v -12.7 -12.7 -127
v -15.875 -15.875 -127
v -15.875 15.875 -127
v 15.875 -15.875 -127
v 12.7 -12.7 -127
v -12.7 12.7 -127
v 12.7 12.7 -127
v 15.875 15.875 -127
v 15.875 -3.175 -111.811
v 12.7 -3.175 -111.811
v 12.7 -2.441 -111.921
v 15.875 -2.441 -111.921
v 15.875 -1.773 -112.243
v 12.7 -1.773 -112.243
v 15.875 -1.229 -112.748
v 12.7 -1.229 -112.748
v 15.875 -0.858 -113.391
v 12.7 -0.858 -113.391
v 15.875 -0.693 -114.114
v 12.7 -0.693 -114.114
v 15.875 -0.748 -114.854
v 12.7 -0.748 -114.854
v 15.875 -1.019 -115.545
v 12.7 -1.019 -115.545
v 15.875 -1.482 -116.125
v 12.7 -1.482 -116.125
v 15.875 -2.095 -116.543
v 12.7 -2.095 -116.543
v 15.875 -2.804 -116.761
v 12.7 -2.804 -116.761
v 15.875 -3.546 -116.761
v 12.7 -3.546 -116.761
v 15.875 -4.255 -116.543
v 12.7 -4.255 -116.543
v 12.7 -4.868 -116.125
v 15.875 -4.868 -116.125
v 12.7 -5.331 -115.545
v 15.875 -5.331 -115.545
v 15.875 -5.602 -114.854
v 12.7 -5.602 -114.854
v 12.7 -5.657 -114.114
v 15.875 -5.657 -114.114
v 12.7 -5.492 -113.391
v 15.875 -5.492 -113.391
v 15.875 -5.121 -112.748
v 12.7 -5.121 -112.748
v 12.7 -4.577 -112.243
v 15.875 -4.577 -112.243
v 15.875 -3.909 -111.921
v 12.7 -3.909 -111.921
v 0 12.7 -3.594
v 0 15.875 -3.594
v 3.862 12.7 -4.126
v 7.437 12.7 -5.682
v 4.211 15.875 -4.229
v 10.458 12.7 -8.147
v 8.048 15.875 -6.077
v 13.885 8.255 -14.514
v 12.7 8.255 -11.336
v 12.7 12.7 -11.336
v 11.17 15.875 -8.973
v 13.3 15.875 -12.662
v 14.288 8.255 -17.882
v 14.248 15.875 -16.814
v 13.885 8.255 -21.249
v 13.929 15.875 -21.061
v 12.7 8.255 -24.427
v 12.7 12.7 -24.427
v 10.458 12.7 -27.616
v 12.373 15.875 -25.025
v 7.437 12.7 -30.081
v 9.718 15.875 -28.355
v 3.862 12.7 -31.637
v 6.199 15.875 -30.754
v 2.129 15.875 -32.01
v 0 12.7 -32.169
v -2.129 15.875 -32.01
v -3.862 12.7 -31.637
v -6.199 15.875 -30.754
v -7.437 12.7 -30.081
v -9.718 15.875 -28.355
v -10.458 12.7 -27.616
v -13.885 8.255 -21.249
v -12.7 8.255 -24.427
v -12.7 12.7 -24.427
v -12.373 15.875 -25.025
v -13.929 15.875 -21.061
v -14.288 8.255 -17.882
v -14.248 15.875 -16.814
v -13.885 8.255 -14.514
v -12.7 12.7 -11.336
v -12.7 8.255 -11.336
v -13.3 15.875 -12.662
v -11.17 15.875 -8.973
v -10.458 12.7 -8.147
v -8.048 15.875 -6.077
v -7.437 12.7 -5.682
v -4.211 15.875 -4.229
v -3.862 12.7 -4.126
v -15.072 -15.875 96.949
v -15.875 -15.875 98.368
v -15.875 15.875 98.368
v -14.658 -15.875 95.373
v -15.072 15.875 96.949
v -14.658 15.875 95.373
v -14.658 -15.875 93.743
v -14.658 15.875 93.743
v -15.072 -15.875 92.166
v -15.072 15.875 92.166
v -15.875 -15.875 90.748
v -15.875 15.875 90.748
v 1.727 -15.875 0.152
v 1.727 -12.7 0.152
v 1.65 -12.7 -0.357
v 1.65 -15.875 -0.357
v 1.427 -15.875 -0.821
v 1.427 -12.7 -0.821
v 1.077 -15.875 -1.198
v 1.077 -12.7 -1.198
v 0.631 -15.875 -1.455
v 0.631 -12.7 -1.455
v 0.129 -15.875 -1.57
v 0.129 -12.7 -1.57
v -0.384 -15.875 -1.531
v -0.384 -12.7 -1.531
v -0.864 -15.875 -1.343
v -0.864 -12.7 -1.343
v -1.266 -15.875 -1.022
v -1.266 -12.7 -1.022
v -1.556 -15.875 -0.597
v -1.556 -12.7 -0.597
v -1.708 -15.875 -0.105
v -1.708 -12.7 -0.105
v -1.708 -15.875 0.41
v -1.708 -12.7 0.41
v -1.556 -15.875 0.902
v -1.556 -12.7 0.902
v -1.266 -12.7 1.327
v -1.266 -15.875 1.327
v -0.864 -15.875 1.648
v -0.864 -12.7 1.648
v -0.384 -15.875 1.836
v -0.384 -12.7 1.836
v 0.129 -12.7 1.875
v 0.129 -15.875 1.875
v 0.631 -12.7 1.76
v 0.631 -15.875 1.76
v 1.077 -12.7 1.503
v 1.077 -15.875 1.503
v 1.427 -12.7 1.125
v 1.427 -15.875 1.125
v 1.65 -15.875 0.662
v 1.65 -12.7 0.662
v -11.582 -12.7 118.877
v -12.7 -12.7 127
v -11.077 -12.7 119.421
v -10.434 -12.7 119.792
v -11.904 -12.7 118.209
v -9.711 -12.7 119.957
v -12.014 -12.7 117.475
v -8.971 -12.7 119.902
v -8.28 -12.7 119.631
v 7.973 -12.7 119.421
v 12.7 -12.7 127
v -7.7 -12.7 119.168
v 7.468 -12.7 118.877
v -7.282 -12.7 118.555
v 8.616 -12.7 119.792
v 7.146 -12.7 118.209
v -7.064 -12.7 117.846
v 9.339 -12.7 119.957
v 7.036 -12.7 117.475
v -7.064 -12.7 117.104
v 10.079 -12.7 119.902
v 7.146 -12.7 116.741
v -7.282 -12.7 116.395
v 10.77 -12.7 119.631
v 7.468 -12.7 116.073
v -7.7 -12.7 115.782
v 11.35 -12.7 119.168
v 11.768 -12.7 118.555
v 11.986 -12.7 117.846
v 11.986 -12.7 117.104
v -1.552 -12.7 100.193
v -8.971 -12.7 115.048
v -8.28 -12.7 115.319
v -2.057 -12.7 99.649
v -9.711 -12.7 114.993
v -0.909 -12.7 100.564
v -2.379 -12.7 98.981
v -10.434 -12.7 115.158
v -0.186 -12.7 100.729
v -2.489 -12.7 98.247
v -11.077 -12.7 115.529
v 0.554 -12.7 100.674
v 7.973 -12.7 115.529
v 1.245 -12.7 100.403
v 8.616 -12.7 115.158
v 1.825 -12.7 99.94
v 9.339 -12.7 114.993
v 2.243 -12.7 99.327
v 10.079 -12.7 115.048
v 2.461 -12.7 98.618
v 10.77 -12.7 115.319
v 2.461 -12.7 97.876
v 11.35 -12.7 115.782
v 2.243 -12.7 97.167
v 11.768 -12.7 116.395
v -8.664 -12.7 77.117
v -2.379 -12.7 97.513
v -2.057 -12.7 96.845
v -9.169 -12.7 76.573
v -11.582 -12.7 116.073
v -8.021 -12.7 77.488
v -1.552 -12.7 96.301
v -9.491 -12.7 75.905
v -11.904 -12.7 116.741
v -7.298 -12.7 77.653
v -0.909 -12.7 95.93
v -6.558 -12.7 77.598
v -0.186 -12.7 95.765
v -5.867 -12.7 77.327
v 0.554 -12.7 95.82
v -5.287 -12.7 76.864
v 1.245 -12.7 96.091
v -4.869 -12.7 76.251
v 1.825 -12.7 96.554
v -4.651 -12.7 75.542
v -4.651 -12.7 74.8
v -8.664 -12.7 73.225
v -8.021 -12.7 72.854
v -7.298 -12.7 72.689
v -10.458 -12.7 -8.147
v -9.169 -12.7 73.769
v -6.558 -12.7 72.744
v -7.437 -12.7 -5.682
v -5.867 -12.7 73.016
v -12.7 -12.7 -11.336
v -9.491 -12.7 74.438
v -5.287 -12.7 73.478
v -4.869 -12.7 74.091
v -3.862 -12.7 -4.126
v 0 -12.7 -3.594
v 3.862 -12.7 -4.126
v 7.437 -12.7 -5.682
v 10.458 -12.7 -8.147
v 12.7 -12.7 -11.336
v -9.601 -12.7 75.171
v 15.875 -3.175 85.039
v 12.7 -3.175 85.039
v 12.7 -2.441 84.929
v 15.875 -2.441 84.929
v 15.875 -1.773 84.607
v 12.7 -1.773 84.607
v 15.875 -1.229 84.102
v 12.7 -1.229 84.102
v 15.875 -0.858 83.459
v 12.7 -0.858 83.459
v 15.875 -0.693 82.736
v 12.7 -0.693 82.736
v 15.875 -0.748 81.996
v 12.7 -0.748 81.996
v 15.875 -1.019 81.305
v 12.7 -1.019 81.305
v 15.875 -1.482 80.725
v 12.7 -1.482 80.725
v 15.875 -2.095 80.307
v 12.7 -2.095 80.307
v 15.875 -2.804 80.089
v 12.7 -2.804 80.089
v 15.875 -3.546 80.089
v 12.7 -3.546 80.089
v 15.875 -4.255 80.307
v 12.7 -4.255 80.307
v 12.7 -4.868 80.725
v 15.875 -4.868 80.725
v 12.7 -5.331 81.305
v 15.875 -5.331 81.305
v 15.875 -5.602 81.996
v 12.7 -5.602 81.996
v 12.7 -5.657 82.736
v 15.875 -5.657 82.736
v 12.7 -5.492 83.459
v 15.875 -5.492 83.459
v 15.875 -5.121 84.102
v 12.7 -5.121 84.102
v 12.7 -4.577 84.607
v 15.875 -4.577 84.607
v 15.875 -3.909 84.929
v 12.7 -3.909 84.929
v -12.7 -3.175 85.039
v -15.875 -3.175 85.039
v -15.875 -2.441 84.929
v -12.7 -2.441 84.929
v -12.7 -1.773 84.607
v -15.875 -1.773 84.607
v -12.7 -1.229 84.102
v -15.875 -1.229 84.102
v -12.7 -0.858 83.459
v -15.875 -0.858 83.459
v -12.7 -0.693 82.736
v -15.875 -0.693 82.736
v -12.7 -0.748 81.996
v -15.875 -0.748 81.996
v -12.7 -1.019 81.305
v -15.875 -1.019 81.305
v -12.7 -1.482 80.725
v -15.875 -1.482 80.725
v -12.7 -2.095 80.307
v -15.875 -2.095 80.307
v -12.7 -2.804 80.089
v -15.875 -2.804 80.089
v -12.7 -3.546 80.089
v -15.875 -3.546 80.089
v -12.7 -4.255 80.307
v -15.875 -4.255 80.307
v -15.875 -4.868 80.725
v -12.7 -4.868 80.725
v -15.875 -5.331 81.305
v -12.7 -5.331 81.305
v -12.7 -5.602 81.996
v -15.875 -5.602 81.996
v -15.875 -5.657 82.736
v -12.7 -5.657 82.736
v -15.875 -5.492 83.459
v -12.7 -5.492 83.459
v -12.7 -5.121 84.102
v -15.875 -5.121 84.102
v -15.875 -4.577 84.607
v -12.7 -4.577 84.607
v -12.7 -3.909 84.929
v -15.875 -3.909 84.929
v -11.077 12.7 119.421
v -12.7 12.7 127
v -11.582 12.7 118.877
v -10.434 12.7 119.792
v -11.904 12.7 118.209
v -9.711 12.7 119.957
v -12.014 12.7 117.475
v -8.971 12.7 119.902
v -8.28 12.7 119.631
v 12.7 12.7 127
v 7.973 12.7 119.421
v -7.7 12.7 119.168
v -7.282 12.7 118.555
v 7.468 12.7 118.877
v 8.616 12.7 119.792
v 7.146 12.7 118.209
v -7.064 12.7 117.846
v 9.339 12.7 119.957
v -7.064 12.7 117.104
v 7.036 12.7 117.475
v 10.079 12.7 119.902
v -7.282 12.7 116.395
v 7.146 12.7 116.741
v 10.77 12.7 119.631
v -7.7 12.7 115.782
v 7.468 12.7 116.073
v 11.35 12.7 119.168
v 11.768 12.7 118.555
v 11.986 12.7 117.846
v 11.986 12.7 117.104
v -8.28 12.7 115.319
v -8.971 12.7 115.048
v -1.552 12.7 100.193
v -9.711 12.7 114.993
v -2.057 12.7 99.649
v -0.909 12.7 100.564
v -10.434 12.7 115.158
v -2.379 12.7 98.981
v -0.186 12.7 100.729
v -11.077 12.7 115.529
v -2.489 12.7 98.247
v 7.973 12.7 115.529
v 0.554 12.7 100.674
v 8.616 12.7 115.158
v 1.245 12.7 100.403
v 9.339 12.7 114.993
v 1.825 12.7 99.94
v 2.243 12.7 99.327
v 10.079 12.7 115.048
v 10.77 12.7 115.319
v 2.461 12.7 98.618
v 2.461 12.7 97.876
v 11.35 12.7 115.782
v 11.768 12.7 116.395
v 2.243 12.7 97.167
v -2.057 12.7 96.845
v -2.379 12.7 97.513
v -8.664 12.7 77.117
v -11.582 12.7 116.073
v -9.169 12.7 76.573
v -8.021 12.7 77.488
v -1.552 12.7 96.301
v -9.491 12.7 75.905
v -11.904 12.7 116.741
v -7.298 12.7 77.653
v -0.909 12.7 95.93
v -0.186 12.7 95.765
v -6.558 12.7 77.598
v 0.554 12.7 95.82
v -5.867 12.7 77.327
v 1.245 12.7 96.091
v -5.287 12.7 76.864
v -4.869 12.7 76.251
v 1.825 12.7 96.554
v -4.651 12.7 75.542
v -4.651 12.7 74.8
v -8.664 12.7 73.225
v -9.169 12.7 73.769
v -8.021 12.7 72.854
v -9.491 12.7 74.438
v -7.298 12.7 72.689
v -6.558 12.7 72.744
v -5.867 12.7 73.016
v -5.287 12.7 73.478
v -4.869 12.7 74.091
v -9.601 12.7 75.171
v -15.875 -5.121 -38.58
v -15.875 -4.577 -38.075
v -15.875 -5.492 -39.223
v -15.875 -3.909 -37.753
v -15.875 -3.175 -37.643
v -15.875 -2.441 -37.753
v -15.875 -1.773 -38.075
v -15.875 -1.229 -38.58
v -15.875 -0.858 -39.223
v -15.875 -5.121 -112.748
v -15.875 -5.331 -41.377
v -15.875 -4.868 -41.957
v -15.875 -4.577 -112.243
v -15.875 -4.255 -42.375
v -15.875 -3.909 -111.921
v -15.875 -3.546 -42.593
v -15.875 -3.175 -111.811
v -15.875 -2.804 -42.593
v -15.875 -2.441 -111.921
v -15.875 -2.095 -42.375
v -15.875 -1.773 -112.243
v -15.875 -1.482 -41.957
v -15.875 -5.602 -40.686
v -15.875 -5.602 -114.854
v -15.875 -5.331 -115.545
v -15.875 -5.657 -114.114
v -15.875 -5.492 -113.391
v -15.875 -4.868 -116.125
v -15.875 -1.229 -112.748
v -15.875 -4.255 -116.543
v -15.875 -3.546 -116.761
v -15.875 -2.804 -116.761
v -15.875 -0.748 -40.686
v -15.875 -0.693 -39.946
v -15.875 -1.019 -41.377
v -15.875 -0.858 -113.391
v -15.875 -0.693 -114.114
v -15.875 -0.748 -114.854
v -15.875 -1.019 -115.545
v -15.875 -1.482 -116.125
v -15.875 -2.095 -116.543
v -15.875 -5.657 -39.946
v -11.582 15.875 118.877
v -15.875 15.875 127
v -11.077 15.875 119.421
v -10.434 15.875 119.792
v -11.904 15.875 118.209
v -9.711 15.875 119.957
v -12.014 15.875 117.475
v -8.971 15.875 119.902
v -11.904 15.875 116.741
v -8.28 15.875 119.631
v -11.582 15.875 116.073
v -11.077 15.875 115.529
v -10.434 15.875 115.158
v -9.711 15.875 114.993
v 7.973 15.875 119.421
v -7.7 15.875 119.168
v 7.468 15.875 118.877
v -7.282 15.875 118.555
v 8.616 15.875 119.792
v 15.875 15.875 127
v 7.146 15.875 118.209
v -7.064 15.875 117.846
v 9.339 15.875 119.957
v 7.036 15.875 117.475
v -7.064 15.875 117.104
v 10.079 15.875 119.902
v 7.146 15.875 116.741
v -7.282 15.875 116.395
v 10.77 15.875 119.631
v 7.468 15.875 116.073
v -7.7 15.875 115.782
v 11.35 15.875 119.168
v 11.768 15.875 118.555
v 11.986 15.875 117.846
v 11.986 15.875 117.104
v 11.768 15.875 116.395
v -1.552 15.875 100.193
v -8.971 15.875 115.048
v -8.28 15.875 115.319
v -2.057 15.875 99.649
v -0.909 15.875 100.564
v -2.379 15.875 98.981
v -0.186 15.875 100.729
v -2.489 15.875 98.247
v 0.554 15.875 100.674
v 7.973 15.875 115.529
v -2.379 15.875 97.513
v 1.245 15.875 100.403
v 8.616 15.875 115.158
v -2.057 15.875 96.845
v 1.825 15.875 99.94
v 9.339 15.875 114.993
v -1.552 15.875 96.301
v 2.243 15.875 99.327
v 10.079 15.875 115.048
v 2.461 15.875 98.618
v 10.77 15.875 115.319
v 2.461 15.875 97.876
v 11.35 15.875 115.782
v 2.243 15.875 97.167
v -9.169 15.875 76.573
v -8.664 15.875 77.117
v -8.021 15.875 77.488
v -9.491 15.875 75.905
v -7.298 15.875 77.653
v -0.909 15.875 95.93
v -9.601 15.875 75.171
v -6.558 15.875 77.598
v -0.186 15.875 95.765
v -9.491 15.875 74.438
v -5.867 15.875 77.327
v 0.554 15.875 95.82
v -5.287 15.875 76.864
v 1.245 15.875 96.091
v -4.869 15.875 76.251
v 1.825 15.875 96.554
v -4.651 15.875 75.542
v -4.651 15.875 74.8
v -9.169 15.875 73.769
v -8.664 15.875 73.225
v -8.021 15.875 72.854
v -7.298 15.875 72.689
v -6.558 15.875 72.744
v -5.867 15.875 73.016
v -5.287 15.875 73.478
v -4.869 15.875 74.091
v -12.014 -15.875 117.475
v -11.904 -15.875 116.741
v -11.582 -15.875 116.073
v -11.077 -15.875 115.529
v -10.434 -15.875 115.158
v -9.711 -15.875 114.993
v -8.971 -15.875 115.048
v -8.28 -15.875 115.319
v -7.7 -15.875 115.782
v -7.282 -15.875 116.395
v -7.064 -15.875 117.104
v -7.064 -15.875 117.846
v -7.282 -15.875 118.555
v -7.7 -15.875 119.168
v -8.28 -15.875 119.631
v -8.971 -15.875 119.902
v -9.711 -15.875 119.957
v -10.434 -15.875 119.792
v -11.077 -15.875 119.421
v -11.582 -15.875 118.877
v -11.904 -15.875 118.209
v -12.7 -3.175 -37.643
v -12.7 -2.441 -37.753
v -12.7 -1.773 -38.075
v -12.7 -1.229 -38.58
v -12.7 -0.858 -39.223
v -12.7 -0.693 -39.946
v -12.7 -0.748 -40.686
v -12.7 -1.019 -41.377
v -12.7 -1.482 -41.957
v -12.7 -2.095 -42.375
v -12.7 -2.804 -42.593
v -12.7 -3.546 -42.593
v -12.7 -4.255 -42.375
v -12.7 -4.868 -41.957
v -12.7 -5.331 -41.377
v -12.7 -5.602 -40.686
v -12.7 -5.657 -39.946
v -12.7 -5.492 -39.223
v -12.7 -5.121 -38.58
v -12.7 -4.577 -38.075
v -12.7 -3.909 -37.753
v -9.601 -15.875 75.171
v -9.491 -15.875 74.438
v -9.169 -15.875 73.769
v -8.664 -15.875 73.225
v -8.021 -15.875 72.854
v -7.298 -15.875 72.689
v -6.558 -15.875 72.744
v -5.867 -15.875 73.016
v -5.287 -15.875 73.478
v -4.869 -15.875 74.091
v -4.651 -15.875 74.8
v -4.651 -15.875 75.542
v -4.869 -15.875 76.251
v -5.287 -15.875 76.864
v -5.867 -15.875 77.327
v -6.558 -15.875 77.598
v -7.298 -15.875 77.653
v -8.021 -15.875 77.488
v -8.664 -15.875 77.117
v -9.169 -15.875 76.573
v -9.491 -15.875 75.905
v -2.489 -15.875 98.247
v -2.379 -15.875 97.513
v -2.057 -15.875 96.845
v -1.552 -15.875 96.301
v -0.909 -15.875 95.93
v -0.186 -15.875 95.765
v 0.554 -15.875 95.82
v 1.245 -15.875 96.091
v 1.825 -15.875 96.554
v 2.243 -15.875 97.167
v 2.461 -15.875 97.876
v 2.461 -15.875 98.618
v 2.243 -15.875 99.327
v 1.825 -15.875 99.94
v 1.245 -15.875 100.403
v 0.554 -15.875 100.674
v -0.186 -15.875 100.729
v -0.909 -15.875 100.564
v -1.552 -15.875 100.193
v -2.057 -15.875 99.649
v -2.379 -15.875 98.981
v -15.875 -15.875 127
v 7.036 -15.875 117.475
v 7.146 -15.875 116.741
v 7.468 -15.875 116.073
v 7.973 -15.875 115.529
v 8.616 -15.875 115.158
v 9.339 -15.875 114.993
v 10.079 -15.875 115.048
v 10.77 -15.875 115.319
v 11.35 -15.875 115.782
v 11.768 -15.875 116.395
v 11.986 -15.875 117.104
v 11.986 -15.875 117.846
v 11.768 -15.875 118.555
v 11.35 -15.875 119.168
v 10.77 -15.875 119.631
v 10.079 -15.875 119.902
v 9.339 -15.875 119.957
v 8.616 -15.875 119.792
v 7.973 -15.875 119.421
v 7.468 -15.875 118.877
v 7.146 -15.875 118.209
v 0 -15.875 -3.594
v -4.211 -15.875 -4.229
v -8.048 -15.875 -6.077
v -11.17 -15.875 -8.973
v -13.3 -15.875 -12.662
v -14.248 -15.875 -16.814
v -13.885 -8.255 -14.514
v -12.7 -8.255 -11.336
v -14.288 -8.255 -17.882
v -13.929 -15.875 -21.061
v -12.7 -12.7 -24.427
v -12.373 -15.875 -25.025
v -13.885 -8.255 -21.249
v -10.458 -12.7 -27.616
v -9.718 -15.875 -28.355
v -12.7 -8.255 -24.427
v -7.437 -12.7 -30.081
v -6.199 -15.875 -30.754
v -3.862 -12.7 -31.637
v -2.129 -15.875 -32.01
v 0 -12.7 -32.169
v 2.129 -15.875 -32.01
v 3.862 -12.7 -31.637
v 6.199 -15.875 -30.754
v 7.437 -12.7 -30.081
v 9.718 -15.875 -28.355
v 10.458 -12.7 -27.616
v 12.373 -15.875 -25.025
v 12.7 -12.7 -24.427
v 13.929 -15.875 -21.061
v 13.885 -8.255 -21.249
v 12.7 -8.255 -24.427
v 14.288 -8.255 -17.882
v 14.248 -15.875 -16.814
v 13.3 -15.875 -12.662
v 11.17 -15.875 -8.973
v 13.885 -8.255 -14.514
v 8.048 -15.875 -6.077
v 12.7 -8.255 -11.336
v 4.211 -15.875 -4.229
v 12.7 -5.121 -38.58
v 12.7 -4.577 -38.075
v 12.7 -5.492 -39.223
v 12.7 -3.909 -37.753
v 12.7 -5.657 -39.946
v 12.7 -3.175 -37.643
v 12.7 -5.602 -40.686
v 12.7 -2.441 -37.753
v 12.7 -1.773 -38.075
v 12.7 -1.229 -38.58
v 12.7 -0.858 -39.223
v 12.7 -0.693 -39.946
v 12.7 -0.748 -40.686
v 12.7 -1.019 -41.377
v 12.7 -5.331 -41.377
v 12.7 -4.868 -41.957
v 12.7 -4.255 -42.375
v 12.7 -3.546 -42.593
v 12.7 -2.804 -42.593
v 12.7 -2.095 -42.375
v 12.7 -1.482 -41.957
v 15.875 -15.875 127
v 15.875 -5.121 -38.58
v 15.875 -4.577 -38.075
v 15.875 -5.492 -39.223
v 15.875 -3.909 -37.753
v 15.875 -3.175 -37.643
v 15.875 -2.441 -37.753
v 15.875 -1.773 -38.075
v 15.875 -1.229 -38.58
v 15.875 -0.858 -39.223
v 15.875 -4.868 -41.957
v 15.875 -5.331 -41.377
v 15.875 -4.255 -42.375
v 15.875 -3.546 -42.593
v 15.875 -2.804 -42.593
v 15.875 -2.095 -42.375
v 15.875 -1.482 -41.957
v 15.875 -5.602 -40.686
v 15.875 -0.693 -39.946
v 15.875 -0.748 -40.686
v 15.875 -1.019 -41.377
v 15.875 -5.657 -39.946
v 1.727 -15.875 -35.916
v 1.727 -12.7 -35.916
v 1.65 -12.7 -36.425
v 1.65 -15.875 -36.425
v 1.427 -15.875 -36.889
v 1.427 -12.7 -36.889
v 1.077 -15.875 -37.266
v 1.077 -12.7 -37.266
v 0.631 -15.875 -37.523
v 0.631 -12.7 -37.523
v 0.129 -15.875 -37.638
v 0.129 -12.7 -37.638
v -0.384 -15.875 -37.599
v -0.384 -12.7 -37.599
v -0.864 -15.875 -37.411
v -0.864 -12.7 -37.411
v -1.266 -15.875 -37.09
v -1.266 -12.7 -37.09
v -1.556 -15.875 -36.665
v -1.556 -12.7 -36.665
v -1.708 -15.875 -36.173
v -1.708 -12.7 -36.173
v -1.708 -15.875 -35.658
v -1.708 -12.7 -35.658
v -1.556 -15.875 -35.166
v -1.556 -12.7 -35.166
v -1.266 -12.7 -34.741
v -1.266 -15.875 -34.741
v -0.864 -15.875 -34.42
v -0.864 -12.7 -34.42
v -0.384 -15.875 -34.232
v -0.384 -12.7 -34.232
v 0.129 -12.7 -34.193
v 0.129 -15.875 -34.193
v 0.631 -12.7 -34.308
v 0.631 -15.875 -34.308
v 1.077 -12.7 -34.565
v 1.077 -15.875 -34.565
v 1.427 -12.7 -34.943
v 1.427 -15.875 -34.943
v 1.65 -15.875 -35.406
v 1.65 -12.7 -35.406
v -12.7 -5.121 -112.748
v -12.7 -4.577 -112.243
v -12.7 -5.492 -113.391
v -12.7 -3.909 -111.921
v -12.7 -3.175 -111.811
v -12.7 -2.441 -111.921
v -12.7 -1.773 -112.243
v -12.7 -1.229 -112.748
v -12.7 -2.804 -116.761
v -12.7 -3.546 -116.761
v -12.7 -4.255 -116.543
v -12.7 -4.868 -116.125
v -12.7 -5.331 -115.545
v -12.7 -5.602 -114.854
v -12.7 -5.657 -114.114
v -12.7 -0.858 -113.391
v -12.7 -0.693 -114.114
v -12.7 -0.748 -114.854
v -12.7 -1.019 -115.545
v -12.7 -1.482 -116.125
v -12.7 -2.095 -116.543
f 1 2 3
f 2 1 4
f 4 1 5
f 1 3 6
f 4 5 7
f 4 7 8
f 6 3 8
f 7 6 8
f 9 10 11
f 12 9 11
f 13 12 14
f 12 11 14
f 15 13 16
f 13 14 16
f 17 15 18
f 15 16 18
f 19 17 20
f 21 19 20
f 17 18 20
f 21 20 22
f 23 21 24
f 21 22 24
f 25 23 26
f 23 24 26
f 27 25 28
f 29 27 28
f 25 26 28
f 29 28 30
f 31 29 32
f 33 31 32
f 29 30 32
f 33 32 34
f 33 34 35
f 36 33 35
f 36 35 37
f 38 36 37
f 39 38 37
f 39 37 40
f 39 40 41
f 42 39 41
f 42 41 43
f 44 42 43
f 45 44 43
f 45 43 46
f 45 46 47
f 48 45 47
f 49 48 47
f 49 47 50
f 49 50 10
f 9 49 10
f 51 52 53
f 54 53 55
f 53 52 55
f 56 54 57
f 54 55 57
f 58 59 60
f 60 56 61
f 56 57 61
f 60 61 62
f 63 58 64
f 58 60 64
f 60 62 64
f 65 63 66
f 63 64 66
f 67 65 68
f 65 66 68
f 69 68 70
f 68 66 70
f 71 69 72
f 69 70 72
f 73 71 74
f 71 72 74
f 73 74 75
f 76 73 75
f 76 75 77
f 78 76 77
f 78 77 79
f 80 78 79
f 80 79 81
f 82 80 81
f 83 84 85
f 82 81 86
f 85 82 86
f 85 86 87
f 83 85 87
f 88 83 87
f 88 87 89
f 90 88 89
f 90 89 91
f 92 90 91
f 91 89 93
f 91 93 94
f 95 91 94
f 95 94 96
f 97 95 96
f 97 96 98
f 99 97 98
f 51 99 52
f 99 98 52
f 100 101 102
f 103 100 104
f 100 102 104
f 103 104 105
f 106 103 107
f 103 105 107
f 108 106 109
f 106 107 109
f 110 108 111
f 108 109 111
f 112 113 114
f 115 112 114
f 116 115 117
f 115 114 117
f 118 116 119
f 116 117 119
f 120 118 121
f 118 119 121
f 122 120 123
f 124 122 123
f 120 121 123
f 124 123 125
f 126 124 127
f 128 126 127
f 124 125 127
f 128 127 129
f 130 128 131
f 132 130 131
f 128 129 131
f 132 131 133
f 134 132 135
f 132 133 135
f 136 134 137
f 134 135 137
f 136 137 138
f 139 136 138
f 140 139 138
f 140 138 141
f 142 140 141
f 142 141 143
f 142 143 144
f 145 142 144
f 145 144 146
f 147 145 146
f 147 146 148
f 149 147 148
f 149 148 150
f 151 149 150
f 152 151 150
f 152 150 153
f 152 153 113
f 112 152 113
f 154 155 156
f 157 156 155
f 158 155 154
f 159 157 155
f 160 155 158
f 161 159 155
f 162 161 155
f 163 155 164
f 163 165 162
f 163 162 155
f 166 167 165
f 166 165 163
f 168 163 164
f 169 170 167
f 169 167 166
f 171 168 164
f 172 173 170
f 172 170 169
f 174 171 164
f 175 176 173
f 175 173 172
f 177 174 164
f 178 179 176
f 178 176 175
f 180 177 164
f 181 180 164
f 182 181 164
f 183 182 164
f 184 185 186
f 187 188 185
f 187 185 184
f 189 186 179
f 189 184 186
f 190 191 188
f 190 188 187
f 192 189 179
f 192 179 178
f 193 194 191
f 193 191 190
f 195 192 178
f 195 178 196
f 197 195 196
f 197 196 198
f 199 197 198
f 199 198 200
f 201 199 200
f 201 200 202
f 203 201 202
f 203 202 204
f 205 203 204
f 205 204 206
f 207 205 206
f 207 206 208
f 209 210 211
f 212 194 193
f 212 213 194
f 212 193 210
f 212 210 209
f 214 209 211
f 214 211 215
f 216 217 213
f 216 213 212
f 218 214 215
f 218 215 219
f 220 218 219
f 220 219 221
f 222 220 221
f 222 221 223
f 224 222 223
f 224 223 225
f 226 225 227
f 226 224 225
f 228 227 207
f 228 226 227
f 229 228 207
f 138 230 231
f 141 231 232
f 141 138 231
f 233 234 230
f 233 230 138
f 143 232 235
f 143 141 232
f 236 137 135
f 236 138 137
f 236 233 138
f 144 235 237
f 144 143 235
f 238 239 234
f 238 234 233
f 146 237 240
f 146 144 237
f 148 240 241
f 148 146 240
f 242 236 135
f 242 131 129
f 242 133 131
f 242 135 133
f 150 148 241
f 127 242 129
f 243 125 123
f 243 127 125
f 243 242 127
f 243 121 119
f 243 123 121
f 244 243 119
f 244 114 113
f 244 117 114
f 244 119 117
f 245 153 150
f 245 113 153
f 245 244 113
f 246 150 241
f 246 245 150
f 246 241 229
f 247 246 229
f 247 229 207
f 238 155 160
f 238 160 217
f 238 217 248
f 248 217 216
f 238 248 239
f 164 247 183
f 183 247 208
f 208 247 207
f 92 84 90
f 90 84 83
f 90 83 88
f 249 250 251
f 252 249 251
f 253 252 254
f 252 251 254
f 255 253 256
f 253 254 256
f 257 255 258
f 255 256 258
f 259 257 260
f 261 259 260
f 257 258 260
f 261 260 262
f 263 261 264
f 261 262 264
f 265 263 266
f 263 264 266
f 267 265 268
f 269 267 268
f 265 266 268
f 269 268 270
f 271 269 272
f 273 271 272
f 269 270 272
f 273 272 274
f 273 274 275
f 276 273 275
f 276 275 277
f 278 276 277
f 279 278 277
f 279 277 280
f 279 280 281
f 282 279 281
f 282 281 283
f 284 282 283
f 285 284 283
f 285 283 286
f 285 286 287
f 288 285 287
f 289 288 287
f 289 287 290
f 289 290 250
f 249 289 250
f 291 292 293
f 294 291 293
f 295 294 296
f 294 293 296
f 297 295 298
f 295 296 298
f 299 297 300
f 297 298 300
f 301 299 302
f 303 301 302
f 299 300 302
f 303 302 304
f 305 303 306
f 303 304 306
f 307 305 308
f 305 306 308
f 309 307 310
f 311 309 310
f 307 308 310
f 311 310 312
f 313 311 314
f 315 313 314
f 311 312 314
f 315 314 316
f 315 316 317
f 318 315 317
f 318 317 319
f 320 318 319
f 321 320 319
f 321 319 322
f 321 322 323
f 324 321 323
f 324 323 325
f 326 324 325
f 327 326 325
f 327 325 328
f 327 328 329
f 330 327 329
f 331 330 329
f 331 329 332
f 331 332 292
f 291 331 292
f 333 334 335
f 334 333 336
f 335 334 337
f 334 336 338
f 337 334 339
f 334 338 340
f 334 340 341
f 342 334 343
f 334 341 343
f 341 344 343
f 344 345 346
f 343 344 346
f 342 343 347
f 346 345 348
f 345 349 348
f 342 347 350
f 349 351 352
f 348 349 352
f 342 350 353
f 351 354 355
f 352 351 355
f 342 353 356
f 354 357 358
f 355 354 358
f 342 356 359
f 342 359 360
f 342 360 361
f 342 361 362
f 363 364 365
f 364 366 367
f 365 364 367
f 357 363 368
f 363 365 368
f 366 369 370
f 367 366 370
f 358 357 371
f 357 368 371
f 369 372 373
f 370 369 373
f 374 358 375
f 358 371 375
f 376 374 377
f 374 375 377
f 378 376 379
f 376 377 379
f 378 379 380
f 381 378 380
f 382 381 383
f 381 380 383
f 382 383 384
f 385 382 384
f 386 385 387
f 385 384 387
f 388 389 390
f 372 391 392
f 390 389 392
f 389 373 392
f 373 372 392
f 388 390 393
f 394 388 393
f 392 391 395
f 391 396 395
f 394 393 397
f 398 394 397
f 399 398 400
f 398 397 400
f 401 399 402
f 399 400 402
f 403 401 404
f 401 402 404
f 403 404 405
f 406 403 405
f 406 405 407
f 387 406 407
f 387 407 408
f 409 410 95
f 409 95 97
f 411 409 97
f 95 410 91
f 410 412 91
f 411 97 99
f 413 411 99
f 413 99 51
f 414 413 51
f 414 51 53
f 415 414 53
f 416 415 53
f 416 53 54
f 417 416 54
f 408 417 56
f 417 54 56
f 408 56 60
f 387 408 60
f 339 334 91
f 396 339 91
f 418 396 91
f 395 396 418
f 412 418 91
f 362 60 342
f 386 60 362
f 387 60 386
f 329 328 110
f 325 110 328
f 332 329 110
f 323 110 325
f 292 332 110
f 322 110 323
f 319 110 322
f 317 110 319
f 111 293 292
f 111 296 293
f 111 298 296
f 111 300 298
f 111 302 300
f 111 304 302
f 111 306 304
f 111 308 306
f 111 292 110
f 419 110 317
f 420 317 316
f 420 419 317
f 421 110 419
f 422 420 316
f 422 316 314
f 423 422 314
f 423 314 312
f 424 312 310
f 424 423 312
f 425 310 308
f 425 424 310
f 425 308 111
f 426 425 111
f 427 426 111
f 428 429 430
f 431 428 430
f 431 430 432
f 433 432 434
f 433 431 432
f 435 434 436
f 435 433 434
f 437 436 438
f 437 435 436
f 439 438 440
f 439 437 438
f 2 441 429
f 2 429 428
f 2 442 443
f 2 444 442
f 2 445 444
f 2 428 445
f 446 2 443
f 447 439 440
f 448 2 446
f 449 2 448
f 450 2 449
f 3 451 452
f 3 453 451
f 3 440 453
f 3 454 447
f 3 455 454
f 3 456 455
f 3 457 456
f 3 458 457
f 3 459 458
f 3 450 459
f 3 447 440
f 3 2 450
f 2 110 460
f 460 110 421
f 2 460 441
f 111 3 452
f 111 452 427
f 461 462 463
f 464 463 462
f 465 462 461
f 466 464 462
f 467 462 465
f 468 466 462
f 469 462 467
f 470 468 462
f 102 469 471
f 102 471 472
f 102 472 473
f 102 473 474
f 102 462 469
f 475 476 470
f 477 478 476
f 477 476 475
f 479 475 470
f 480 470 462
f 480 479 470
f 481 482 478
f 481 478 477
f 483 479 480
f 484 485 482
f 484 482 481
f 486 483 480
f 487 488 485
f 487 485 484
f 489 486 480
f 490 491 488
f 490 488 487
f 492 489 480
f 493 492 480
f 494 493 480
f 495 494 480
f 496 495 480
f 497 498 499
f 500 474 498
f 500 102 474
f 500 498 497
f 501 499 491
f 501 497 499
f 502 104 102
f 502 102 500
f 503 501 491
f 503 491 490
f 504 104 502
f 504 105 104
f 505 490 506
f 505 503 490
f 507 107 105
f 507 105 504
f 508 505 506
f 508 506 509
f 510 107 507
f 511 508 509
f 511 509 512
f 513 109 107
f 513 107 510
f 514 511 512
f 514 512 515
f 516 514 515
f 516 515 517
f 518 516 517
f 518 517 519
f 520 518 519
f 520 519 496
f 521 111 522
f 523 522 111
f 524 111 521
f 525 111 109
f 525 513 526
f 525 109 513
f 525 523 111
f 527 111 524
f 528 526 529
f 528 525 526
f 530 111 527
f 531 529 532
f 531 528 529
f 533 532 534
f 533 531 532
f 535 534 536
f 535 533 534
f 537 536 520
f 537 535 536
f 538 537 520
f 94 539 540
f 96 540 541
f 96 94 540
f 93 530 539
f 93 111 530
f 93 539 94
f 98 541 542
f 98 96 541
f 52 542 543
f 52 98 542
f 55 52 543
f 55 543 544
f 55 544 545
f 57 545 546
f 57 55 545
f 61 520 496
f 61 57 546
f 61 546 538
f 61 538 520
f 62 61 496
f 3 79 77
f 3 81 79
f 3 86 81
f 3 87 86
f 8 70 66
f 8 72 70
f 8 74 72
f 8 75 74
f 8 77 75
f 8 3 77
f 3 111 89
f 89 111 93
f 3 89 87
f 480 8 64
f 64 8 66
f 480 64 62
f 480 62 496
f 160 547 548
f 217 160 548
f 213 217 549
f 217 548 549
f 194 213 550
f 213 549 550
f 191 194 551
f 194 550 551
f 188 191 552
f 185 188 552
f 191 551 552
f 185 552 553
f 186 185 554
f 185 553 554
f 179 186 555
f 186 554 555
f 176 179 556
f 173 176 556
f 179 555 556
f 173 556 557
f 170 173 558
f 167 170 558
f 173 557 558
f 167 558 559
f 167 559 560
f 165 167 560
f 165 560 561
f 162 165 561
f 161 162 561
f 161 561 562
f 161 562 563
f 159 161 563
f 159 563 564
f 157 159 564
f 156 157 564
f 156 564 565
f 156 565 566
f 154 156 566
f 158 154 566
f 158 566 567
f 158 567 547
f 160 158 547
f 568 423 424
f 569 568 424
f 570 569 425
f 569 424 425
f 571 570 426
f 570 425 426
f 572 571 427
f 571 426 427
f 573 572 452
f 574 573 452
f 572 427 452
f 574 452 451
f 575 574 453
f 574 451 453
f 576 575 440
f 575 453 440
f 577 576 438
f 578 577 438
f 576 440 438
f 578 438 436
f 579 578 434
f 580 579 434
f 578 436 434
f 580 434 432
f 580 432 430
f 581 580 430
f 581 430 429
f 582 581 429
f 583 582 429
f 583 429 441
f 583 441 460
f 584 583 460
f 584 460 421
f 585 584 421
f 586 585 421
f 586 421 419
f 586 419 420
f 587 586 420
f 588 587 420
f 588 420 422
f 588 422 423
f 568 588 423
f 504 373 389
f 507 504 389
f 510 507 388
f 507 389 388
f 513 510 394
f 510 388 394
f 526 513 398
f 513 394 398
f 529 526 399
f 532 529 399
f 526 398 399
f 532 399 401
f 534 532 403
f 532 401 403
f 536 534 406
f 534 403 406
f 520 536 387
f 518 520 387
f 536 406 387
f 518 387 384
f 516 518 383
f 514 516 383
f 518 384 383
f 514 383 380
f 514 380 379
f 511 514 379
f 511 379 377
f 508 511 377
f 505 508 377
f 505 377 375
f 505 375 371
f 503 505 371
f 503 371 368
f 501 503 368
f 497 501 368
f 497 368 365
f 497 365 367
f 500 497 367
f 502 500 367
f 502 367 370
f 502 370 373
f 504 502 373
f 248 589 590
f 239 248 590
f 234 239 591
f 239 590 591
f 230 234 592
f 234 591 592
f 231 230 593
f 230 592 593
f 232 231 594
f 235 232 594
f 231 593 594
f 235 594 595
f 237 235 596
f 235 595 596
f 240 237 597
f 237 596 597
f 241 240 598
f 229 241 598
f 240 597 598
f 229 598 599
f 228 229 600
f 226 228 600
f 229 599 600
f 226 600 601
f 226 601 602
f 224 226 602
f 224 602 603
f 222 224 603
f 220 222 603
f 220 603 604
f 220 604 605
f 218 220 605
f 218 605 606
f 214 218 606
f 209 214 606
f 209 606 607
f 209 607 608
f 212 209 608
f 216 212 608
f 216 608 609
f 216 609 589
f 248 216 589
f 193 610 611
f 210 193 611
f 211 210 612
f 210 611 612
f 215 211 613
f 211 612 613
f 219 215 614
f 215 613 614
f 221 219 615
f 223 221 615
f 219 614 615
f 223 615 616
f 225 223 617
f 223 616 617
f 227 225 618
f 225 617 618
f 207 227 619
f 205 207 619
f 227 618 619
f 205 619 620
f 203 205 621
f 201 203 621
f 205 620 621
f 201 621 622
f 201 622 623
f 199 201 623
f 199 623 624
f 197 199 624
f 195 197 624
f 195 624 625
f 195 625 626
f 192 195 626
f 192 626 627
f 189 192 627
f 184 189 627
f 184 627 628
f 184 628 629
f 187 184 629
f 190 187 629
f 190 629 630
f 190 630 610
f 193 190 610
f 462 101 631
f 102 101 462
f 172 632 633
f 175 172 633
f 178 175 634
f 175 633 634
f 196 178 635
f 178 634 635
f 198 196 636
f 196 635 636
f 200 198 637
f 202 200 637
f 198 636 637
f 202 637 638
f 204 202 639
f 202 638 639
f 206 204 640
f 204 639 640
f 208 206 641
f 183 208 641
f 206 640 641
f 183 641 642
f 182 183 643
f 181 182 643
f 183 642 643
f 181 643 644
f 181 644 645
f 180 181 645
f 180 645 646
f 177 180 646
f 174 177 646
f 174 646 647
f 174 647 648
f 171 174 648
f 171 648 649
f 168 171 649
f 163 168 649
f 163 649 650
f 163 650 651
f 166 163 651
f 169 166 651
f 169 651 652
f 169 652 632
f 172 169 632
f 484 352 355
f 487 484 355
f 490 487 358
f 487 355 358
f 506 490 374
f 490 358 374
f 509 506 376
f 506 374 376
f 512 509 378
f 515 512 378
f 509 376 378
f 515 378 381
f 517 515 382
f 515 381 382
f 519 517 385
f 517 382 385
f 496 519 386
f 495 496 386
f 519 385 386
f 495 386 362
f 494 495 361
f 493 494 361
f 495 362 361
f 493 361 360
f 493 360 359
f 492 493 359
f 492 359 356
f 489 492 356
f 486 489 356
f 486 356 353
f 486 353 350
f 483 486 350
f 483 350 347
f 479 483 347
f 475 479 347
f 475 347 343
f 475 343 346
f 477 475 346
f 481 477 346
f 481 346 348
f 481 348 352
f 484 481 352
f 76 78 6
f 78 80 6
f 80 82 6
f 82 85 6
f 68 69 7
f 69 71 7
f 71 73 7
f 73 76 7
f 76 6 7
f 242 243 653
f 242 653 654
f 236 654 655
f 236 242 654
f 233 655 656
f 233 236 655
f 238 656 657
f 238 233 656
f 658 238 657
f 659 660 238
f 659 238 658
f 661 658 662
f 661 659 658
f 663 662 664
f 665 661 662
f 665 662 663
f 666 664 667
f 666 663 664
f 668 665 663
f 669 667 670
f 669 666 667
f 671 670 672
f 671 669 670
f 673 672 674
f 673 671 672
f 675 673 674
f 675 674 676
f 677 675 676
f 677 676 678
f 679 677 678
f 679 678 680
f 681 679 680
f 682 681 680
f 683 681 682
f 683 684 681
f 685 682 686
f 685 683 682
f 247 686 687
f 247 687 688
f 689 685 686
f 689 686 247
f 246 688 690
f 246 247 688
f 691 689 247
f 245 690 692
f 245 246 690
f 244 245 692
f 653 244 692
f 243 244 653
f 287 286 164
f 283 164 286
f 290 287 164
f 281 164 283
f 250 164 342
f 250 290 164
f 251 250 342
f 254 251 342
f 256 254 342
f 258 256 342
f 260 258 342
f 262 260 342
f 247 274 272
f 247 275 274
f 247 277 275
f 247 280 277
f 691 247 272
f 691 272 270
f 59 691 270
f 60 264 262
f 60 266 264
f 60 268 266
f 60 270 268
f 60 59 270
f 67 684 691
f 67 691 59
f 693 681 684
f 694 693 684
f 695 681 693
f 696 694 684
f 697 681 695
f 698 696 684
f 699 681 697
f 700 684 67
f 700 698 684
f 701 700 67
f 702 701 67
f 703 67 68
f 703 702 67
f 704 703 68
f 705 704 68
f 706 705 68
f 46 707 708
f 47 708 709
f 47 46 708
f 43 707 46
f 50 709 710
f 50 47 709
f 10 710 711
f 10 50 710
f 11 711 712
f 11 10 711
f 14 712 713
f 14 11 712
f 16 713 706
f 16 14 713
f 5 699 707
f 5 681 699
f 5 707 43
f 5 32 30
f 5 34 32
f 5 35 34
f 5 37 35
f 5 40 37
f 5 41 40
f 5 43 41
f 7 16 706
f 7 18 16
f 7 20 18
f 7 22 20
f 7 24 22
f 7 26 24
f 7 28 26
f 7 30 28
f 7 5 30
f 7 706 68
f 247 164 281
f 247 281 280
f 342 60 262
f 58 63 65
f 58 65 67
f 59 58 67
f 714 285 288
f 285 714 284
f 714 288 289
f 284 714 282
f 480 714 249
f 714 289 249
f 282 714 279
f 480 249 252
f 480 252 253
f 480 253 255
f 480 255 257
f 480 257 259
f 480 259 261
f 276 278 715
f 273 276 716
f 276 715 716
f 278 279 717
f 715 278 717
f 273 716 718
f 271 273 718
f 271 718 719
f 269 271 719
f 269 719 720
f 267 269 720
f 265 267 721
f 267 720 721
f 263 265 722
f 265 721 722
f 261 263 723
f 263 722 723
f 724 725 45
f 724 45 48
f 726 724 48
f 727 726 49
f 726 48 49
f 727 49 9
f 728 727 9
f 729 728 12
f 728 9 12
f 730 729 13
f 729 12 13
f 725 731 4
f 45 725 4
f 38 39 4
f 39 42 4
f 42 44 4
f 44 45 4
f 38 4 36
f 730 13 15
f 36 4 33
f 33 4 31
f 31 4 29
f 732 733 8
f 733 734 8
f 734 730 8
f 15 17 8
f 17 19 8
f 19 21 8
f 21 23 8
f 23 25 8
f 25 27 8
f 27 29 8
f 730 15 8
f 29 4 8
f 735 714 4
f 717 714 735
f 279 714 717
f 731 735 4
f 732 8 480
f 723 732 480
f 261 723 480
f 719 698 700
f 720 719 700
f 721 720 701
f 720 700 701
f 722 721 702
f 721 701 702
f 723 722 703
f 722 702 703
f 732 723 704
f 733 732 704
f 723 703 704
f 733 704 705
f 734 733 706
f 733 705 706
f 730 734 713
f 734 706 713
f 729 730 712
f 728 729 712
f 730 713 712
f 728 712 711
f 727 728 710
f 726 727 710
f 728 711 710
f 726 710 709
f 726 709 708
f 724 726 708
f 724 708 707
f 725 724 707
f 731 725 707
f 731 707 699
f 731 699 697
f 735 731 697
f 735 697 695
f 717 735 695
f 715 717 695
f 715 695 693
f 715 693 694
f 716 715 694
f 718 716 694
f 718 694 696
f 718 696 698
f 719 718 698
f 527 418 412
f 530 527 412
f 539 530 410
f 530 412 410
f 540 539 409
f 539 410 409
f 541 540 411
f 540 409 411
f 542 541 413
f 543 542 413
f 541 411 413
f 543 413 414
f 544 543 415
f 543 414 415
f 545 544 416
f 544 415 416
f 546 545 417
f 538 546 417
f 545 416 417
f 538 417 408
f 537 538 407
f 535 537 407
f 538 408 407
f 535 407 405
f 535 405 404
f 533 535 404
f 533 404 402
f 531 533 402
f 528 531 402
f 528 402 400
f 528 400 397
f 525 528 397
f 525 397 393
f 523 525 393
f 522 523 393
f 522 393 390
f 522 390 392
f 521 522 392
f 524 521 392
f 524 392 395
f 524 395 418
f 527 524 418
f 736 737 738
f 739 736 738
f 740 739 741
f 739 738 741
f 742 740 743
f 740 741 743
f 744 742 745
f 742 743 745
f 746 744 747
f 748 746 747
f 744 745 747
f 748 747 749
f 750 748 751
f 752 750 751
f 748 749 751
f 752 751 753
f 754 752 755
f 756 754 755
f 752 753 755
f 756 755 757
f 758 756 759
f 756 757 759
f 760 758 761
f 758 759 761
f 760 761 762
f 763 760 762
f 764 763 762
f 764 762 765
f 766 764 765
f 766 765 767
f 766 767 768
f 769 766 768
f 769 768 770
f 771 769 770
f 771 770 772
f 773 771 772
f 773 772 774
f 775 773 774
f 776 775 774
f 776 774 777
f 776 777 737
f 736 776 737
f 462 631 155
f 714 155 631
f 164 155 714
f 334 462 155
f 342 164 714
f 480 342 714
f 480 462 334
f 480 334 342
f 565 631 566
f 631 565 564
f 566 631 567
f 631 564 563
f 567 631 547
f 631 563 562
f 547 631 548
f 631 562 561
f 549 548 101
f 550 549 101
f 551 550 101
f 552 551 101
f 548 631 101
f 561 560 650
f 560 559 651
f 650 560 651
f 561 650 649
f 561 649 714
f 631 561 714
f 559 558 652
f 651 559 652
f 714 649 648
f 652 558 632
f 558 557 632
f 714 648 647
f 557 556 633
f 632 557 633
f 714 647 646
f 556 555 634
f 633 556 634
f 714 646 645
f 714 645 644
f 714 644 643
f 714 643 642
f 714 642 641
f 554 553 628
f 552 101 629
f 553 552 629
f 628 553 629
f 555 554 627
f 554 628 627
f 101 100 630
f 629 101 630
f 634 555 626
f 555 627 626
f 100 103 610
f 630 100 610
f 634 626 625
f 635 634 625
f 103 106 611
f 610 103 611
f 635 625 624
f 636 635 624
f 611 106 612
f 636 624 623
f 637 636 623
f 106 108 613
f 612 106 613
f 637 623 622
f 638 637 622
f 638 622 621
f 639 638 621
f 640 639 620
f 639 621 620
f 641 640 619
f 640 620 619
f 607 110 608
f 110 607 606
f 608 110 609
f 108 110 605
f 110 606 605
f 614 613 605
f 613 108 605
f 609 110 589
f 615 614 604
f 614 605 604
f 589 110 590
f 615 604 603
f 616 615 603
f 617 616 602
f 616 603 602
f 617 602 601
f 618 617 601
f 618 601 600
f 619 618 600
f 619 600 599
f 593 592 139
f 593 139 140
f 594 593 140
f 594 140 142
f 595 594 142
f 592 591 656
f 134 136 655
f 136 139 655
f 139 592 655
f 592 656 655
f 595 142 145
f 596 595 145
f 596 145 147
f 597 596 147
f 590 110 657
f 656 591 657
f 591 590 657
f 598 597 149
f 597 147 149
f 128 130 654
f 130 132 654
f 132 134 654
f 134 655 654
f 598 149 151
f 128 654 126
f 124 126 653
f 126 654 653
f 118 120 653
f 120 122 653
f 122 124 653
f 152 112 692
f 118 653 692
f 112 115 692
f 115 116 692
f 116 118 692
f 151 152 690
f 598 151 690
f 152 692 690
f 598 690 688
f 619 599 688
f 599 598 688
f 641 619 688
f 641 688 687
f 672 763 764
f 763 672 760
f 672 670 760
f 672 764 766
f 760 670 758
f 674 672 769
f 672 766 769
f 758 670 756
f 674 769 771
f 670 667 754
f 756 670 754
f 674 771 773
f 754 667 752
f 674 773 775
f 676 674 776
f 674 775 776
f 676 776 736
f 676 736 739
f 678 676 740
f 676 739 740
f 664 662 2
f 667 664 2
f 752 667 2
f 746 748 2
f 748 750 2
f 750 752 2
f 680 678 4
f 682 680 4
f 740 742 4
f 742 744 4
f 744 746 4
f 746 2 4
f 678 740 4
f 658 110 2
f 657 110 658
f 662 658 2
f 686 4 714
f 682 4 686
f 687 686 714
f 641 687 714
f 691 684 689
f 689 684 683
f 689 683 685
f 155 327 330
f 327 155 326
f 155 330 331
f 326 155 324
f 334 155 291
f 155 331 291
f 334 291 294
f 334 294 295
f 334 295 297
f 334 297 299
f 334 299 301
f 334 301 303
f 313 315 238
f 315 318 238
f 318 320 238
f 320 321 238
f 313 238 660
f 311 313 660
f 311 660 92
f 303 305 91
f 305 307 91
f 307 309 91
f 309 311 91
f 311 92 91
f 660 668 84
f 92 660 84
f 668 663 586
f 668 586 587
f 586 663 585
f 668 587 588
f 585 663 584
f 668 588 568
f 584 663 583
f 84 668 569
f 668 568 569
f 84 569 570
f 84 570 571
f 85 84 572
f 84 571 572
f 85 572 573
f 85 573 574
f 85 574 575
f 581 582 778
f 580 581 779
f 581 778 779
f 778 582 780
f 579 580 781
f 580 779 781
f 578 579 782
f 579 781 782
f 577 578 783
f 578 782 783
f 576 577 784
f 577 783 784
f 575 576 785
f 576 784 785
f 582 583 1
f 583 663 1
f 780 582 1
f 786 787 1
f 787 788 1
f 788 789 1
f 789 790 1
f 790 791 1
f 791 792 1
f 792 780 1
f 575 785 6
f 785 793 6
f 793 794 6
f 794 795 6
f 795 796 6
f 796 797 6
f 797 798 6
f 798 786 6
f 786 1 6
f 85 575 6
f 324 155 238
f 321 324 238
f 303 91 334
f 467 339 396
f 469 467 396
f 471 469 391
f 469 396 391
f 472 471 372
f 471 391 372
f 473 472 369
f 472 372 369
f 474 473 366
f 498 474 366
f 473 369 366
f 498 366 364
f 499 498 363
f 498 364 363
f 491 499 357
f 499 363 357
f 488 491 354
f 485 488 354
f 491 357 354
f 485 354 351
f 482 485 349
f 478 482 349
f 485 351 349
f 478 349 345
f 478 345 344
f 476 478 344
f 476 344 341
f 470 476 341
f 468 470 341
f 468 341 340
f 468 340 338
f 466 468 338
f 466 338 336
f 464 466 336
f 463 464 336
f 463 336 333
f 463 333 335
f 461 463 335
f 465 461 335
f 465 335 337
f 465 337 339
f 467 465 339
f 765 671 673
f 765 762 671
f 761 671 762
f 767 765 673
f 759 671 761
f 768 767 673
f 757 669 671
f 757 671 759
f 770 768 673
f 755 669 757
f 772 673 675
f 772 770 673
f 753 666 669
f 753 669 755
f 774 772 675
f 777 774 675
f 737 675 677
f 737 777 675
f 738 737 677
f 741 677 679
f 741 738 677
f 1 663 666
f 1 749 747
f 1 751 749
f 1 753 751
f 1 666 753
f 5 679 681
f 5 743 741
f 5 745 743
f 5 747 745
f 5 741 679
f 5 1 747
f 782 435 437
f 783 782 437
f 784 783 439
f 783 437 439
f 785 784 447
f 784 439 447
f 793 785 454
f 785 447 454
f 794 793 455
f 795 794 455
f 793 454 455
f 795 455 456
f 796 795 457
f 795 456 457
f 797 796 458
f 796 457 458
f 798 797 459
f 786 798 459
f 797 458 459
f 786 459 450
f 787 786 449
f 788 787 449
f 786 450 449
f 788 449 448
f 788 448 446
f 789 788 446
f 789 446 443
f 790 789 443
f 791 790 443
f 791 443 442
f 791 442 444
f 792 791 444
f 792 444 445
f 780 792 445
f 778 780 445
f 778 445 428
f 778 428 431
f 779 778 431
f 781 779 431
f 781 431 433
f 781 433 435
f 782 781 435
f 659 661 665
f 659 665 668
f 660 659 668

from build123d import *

# Parameters (mm, degrees)
BOSS_EXTRUDE1_DEPTH           = 127
BOSS_EXTRUDE1_DEPTH_BACK      = 127
SKETCH3_W                     = 31.75
SKETCH3_H                     = 31.75
SKETCH3_W_2                   = 25.4
SKETCH3_H_2                   = 25.4
F_10_CLEARANCE_HOLE1_D        = 4.9784
SKETCH7_R                     = 14.2875
CUT_EXTRUDE1_DEPTH            = 7.62
CUT_EXTRUDE2_START            = -7.62
SKETCH8_R                     = 14.2875
CUT_EXTRUDE2_DEPTH            = 7.62
F_10_CLEARANCE_HOLE2_D        = 4.9784
SKETCH12_R                    = 6.35
CUT_EXTRUDE3_DEPTH            = 132.867653824
TAP_DRILL_FOR_8_32_TAP1_D     = 3.4544
TAP_DRILL_FOR_8_32_TAP1_DEPTH = 5.08
TAP_DRILL_FOR_8_32_TAP1_TIP   = 1.037806461


with BuildPart() as part:
    # Sketch3 → Boss-Extrude1 (new, two sides: drawn at the far end of the back side and taken through both)
    with BuildSketch(Plane.XY.offset(-BOSS_EXTRUDE1_DEPTH_BACK)):
        Rectangle(SKETCH3_W, SKETCH3_H)
        Rectangle(SKETCH3_W_2, SKETCH3_H_2, mode=Mode.SUBTRACT)
    extrude(amount=BOSS_EXTRUDE1_DEPTH + BOSS_EXTRUDE1_DEPTH_BACK)

    # #10 Clearance Hole1 (through all)
    with Locations(Plane(origin=(0, 15.875, 0), x_dir=(1, 0, 0), z_dir=(0, 1, 0))):
        with Locations((-9.525, -117.475), (9.525, -117.475), (0, -98.247200001), (-7.111939052, -75.171256705)):
            Hole(F_10_CLEARANCE_HOLE1_D / 2)

    # Sketch7 → Cut-Extrude1 (cut)
    with BuildSketch(Plane(origin=(0, 15.875, 0), x_dir=(1, 0, 0), z_dir=(0, 1, 0))):
        with Locations(Location((0, 17.8816, 0), (0, 0, 270))):
            Circle(SKETCH7_R)
    extrude(amount=-CUT_EXTRUDE1_DEPTH, mode=Mode.SUBTRACT)

    # Sketch8 → Cut-Extrude2 (cut)
    with BuildSketch(Plane.XZ.offset(15.875).offset(CUT_EXTRUDE2_START)):
        with Locations(Location((0, -17.8816, 0), (0, 0, 90))):
            Circle(SKETCH8_R)
    extrude(amount=CUT_EXTRUDE2_DEPTH, mode=Mode.SUBTRACT)

    # #10 Clearance Hole2 (through all)
    with Locations(Plane(origin=(15.875, 0, 0), x_dir=(0, 0, -1), z_dir=(1, 0, 0))):
        with Locations((-82.55, -3.175), (114.3, -3.175), (40.132, -3.175)):
            Hole(F_10_CLEARANCE_HOLE2_D / 2)

    # Sketch12 → Cut-Extrude3 (cut, through all)
    with BuildSketch(Plane(origin=(0, 15.875, 0), x_dir=(1, 0, 0), z_dir=(0, 1, 0))):
        with Locations((-20.955, -94.557636183)):
            Circle(SKETCH12_R)
    extrude(amount=-CUT_EXTRUDE3_DEPTH, mode=Mode.SUBTRACT)

    # Tap Drill for #8-32 Tap1
    with Locations(Plane(origin=(0, -15.875, 0), x_dir=(-1, 0, 0), z_dir=(0, -1, 0))):
        with Locations((0, 35.9156), (0, -0.1524)):
            Hole(TAP_DRILL_FOR_8_32_TAP1_D / 2, depth=TAP_DRILL_FOR_8_32_TAP1_DEPTH)
            with Locations((0, 0, -(TAP_DRILL_FOR_8_32_TAP1_DEPTH + TAP_DRILL_FOR_8_32_TAP1_TIP / 2))):  # 118° drill point
                Cone(0, TAP_DRILL_FOR_8_32_TAP1_D / 2, TAP_DRILL_FOR_8_32_TAP1_TIP, mode=Mode.SUBTRACT)


solid = part.part
